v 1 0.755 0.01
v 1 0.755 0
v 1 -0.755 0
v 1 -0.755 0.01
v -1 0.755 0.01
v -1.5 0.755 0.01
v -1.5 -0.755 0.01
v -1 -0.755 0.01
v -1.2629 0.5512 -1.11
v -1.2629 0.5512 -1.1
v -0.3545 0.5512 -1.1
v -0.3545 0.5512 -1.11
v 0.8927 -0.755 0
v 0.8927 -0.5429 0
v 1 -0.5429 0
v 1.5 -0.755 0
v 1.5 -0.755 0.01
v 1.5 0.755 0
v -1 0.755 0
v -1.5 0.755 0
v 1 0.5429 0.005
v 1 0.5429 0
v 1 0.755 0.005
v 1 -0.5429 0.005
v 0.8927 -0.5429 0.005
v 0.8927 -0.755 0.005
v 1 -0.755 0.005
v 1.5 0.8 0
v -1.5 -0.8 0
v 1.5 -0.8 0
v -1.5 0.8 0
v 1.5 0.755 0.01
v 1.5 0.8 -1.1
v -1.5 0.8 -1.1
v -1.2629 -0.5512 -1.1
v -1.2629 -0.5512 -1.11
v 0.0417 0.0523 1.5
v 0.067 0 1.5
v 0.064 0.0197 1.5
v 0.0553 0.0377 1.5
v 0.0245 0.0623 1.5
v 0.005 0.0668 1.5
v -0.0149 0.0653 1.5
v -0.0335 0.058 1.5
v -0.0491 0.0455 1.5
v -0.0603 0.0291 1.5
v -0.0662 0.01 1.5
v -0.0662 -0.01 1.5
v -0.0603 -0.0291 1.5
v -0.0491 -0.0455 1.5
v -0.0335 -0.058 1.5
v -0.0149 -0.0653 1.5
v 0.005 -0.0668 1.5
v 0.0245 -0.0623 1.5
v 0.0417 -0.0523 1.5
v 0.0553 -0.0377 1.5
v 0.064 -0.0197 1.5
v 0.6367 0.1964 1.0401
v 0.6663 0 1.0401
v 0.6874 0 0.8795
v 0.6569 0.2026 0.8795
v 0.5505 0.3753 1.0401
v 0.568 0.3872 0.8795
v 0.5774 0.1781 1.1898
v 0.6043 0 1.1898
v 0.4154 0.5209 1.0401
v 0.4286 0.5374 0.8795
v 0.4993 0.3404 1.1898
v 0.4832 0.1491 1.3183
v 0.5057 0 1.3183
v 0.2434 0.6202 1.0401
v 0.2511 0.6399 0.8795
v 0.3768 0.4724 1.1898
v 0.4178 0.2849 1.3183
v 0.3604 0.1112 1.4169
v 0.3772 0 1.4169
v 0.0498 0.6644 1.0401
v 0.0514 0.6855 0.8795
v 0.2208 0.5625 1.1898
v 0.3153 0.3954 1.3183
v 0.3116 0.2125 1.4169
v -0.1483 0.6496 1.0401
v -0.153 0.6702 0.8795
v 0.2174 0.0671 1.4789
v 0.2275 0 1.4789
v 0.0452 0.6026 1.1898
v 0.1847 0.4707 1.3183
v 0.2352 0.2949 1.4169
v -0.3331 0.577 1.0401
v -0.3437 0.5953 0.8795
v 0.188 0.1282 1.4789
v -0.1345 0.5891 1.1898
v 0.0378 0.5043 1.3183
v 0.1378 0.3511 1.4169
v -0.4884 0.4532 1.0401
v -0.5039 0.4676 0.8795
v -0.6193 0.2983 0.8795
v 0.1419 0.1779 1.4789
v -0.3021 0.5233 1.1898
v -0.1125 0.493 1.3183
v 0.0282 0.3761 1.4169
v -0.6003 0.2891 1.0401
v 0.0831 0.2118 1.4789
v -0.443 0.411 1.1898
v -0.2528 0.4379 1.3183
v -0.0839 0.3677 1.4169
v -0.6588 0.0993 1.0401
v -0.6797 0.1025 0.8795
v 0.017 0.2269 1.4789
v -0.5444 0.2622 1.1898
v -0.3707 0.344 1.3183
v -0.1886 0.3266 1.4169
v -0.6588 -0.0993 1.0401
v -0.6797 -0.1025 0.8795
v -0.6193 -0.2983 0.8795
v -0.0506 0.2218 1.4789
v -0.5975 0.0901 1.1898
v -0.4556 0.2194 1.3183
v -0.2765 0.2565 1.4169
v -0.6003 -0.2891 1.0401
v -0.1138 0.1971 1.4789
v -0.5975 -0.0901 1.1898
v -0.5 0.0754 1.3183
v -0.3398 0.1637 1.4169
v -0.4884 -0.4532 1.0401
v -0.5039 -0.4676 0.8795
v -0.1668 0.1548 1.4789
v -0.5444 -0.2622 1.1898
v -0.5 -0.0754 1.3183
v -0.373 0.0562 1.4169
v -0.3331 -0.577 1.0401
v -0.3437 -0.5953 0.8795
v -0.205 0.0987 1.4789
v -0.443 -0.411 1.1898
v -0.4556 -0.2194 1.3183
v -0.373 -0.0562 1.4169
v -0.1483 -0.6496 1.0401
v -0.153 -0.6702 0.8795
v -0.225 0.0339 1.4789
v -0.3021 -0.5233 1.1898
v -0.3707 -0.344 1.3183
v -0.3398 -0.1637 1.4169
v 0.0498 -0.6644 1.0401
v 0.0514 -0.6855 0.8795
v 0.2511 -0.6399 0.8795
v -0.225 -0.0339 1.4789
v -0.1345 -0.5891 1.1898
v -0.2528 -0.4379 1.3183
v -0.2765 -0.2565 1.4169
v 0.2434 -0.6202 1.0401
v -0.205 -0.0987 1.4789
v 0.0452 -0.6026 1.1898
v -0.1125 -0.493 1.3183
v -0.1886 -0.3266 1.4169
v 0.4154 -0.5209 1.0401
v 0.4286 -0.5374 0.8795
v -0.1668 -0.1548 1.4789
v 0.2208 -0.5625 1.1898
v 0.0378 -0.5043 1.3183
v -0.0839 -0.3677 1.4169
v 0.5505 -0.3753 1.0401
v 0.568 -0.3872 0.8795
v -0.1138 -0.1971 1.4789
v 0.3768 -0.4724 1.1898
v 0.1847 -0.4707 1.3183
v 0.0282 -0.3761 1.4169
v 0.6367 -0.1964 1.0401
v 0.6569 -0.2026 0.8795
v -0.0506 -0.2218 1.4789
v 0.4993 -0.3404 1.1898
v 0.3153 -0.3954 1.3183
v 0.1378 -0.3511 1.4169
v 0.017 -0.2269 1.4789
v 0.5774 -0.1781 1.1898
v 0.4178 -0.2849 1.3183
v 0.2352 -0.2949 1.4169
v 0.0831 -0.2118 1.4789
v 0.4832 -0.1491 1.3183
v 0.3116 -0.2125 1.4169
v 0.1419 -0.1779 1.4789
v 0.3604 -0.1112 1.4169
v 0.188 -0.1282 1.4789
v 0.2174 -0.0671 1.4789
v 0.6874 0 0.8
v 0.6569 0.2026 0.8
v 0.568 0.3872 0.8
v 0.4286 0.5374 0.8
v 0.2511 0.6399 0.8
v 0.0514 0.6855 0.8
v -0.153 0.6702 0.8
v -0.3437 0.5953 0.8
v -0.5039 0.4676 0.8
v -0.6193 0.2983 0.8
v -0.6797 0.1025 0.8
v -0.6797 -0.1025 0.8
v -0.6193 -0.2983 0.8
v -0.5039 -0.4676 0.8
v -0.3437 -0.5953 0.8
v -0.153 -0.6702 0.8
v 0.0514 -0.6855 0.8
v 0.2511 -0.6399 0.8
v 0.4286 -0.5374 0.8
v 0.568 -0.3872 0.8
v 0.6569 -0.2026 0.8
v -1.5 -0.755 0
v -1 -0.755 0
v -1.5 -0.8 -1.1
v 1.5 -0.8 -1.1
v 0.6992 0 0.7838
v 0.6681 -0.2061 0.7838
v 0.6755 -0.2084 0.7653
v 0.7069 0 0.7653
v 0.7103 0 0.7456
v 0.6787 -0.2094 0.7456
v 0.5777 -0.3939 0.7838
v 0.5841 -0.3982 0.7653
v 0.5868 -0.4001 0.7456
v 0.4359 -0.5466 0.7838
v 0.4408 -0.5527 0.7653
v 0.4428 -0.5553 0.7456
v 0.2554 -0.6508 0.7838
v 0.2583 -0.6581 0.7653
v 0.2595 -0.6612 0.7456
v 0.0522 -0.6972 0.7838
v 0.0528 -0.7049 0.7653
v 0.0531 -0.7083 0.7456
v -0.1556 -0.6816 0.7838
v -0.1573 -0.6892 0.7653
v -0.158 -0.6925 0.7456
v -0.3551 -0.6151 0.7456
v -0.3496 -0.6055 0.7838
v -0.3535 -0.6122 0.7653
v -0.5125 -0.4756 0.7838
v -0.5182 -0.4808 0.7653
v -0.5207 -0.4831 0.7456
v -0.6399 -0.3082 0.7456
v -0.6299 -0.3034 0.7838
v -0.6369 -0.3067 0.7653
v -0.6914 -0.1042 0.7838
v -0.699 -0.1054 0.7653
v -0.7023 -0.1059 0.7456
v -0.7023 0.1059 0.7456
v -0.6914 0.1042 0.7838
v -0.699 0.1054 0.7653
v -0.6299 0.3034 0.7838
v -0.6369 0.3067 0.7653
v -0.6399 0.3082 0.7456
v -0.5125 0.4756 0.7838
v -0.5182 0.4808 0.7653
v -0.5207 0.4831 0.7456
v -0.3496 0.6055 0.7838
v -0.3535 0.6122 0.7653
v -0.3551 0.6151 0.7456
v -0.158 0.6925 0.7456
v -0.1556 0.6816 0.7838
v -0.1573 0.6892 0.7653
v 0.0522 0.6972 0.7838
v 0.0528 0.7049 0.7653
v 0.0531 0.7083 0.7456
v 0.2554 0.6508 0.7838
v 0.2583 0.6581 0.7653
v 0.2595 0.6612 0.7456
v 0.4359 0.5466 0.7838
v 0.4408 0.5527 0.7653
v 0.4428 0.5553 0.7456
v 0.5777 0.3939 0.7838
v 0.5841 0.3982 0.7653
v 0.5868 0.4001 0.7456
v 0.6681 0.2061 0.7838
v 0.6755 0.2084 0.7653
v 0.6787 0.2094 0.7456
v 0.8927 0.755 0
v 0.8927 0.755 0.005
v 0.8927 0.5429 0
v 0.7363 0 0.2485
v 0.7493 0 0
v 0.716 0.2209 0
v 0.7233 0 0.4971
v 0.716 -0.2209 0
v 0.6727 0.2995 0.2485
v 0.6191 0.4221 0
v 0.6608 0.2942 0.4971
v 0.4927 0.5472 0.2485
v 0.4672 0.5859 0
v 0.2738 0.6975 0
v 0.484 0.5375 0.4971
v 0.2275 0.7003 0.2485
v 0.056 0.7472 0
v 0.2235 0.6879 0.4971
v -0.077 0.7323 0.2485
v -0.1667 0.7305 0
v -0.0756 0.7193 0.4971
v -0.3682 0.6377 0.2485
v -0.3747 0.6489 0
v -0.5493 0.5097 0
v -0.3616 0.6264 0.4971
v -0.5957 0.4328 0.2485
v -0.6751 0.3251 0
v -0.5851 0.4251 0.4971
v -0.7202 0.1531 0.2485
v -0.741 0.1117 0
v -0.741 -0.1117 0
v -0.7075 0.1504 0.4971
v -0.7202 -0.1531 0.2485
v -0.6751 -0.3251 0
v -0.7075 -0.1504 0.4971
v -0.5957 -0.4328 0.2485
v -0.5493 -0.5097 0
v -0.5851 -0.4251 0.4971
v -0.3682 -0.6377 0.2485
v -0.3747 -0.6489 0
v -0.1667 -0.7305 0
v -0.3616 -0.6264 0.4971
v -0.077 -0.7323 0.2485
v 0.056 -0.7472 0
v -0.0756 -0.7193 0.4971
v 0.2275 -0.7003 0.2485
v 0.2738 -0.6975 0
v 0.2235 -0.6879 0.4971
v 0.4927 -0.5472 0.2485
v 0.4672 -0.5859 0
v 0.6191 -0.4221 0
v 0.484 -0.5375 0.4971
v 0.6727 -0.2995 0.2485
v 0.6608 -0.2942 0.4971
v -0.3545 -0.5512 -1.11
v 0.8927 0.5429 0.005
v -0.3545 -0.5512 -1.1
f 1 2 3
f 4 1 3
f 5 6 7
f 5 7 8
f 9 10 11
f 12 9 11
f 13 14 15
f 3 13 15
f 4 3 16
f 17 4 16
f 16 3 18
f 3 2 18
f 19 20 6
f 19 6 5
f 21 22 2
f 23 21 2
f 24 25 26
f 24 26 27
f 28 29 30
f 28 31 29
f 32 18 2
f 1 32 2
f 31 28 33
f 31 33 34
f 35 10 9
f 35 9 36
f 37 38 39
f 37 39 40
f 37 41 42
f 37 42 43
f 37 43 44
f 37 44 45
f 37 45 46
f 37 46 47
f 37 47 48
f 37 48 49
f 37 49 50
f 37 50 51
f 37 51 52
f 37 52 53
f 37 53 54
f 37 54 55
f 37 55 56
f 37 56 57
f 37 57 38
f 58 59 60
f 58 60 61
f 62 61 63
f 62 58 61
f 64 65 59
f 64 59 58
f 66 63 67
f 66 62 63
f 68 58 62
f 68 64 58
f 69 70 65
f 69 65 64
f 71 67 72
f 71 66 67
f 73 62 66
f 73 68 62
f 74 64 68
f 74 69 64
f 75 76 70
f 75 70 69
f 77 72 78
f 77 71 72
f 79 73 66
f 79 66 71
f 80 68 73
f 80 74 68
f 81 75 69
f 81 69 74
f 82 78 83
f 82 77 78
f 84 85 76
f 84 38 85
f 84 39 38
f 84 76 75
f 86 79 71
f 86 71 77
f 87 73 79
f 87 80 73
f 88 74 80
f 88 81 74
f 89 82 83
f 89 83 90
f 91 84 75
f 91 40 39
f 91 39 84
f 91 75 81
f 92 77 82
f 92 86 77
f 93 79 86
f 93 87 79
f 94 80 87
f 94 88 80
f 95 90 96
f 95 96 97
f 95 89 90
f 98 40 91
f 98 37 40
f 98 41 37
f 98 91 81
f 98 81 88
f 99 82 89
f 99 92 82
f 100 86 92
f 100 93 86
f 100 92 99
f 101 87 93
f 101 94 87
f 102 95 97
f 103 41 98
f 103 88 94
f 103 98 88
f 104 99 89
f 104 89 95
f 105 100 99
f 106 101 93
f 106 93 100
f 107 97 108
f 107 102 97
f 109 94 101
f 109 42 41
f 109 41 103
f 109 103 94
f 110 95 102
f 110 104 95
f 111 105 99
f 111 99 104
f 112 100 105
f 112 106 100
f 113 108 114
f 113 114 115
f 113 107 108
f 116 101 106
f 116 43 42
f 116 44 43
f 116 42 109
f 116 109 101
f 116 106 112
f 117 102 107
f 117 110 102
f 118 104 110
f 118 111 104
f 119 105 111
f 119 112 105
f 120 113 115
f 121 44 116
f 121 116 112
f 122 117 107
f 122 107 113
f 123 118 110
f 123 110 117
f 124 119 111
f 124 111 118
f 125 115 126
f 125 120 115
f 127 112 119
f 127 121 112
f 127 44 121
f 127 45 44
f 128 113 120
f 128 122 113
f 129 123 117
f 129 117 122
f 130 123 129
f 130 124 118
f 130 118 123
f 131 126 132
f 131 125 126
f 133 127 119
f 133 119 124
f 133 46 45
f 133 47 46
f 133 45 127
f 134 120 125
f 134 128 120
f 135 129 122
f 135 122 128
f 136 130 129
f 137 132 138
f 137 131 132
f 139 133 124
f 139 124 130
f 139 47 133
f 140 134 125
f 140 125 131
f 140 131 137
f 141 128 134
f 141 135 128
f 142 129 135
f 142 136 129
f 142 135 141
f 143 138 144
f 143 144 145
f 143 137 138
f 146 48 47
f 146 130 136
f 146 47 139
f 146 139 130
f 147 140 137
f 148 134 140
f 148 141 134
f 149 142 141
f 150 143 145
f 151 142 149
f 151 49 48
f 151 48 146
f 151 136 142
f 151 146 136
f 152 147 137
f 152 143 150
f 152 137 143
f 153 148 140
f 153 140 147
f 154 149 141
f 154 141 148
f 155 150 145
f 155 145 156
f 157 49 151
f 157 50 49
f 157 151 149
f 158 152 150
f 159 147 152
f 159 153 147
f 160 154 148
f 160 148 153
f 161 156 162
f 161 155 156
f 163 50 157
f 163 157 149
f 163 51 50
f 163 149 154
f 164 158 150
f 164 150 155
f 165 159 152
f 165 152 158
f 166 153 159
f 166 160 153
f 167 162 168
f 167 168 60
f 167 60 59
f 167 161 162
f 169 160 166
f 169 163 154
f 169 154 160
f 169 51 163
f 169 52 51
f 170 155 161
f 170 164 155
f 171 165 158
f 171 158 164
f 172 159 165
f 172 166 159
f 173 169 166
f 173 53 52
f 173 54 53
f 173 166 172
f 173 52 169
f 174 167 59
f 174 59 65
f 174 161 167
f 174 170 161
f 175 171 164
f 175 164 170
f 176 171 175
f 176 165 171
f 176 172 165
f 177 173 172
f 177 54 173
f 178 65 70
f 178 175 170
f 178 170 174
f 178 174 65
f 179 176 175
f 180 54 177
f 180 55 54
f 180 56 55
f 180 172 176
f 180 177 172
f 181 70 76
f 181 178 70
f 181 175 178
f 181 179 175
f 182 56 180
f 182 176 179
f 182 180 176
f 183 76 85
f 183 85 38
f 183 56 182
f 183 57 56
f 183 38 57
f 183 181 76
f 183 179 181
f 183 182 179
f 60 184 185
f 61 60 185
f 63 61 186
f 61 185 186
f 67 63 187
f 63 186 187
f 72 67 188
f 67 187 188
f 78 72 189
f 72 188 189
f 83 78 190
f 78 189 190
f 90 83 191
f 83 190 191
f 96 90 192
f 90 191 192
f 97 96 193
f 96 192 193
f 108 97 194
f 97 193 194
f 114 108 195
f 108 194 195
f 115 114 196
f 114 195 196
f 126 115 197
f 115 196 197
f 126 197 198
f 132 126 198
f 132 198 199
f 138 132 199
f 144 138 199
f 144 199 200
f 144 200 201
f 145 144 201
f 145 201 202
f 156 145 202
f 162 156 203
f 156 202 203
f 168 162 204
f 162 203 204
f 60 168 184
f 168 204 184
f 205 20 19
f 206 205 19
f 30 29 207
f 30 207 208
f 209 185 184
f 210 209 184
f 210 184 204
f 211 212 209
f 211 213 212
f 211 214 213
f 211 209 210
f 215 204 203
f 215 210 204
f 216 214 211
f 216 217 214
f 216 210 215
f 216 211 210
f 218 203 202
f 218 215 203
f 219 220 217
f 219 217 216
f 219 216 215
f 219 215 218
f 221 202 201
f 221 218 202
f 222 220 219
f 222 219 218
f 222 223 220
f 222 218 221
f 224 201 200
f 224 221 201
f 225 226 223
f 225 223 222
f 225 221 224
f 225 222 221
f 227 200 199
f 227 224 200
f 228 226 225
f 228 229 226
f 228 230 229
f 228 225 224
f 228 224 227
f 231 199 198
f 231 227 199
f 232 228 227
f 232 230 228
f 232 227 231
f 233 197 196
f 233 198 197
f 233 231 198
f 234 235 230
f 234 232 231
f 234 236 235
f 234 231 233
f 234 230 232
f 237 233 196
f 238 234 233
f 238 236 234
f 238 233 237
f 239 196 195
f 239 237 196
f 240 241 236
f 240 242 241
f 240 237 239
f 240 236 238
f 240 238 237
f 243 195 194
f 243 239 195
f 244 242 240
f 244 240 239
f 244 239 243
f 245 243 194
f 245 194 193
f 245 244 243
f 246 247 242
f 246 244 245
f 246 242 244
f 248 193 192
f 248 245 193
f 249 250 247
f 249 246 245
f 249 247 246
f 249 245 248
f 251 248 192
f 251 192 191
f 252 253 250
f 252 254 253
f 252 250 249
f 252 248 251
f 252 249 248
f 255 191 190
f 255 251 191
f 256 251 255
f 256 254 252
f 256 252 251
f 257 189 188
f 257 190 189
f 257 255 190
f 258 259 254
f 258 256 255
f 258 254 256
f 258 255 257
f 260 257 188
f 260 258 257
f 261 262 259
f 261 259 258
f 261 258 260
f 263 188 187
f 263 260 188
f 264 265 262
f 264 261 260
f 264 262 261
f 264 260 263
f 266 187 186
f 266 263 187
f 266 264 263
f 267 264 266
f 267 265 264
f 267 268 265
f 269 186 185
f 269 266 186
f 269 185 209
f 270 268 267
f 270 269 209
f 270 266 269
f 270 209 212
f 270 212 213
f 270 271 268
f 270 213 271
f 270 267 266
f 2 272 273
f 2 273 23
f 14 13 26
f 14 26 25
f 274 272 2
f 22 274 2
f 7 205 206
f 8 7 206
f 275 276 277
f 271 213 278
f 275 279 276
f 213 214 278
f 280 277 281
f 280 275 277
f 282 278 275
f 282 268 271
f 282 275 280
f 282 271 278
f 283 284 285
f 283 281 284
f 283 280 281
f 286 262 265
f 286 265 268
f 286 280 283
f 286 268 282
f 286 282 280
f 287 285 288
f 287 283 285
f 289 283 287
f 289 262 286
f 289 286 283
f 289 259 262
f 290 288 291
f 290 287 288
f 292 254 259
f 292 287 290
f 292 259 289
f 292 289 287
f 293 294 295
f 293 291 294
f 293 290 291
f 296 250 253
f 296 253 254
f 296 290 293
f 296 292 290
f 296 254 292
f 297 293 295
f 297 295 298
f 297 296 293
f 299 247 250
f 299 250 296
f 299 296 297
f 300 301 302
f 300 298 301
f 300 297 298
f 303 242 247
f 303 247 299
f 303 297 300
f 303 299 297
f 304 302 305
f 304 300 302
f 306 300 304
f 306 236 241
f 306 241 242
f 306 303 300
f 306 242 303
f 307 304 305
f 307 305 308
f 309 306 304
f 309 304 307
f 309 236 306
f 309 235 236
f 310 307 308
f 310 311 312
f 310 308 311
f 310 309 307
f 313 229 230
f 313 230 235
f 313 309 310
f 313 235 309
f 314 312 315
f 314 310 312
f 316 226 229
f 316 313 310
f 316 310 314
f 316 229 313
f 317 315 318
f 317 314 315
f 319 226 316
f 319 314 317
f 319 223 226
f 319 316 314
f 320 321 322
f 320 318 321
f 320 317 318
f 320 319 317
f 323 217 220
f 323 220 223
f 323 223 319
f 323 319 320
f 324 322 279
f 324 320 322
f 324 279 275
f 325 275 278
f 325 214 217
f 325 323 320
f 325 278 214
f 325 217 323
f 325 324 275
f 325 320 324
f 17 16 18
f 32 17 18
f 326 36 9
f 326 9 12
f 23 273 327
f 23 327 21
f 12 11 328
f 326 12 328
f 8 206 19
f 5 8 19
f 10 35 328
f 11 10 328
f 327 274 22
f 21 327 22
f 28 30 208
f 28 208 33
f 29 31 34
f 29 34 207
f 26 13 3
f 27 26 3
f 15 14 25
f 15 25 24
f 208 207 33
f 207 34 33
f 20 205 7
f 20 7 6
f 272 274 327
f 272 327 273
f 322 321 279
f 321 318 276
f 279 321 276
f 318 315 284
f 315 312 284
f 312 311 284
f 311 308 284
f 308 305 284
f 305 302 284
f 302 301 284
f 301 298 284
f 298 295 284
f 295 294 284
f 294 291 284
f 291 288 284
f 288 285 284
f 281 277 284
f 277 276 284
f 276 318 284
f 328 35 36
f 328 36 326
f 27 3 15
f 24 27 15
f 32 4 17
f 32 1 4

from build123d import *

# Parameters (mm, degrees)
F0_W      = 0.5
F0_H      = 1.5099706361
F0_R      = 0.7493333287
F0_W_2    = 0.1072544944
F0_H_2    = 0.2120600548
F1_DEPTH  = 1.1
F2_DEPTH  = 0.8
F2_TAPER  = 3
F4_DEPTH  = 0.01
F5_DEPTH  = 0.005
F3_R      = 0.6874071052
F6_DEPTH  = 0.7
F7_R      = 0.6204528855
F9_W      = 0.9084290941
F9_H      = 1.1024641572
F10_DEPTH = 0.01


# Not quite as in the source:
# - a fillet or chamfer that OpenCascade refuses, or shapes differently, is made with other operations: its cross-section is extruded or revolved along the edge and cut away or added


with BuildPart() as f1:
    # F0 (on Top) → F1 (new body)
    with BuildSketch(Plane.XY):
        with Locations((-1.25, 0)):
            Rectangle(F0_W, F0_H)
        Polygon((-1.5, -0.8), (1.5, -0.8), (1.5, -0.7549853181), (1, -0.7549853181), (0.8927455056, -0.7549853181), (0.8927455056, -0.5429252633), (1, -0.5429252633), (1, 0.5429252633), (0.8927455056, 0.5429252633), (0.8927455056, 0.7549853181), (1, 0.7549853181), (1.5, 0.7549853181), (1.5, 0.8), (-1.5, 0.8), (-1.5, 0.7549853181), (-1, 0.7549853181), (-1, -0.7549853181), (-1.5, -0.7549853181), align=None)
        Circle(F0_R, mode=Mode.SUBTRACT)
        Circle(F0_R)
        with Locations((0.9463727528, 0.6489552907)):
            Rectangle(F0_W_2, F0_H_2)
        Polygon((1, -0.7549853181), (1.5, -0.7549853181), (1.5, 0.7549853181), (1, 0.7549853181), (1, 0.5429252633), (1, -0.5429252633), align=None)
        with Locations((0.9463727528, -0.6489552907)):
            Rectangle(F0_W_2, F0_H_2)
    extrude(amount=-F1_DEPTH)


with BuildPart() as f2:
    # F0 (on Top) → F2 (new body)
    with BuildSketch(Plane.XY):
        Circle(F0_R)
    extrude(amount=F2_DEPTH, taper=F2_TAPER)

    # F3 (on face) → F6 (join)
    with BuildSketch(Plane.XY.offset(0.8)):
        Circle(F3_R)
    extrude(amount=F6_DEPTH)

    # F7
    f7_edges = [f2.edges().sort_by_distance(p)[0] for p in [
        (-0.687407, 0, 1.5),
    ]]
    fillet(f7_edges, radius=F7_R)

    # F8: fillet of radius 0.0871635846 on 1 edges, made by hand

    # F8_s1 → F8_t2 (revolve, cut)
    with BuildSketch(Plane.XZ):
        with BuildLine():
            ThreePointArc((0.6874071052, 0.8), (0.703576177, 0.7747914026), (0.7102582005, 0.7455978618))
            Line((0.7102582005, 0.7455978618), (0.7074071052, 0.8))
            Line((0.7074071052, 0.8), (0.6874071052, 0.8))
        make_face()
    revolve(axis=Axis((0, 0, 0.8), (0, 0, -1)), mode=Mode.SUBTRACT)


with BuildPart() as f4:
    # F0 (on Top) → F4 (new body)
    with BuildSketch(Plane.XY):
        with Locations((-1.25, 0)):
            Rectangle(F0_W, F0_H)
    extrude(amount=F4_DEPTH)


with BuildPart() as f4b:
    # F0 (on Top) → F4, piece 2 (new body)
    with BuildSketch(Plane.XY):
        Polygon((1, -0.7549853181), (1.5, -0.7549853181), (1.5, 0.7549853181), (1, 0.7549853181), (1, 0.5429252633), (1, -0.5429252633), align=None)
    extrude(amount=F4_DEPTH)


with BuildPart() as f5:
    # F0 (on Top) → F5 (new body)
    with BuildSketch(Plane.XY):
        with Locations((0.9463727528, -0.6489552907)):
            Rectangle(F0_W_2, F0_H_2)
    extrude(amount=F5_DEPTH)


with BuildPart() as f5b:
    # F0 (on Top) → F5, piece 2 (new body)
    with BuildSketch(Plane.XY):
        with Locations((0.9463727528, 0.6489552907)):
            Rectangle(F0_W_2, F0_H_2)
    extrude(amount=F5_DEPTH)


with BuildPart() as f10:
    # F9 (on face) → F10 (new body)
    with BuildSketch(Plane(origin=(0, 0, -1.1), x_dir=(1, 0, 0), z_dir=(0, 0, -1))):
        with Locations((-0.8086880553, 0)):
            Rectangle(F9_W, F9_H)
    extrude(amount=F10_DEPTH)


solid = Compound([f1.part, f2.part, f4.part, f4b.part, f5.part, f5b.part, f10.part])
